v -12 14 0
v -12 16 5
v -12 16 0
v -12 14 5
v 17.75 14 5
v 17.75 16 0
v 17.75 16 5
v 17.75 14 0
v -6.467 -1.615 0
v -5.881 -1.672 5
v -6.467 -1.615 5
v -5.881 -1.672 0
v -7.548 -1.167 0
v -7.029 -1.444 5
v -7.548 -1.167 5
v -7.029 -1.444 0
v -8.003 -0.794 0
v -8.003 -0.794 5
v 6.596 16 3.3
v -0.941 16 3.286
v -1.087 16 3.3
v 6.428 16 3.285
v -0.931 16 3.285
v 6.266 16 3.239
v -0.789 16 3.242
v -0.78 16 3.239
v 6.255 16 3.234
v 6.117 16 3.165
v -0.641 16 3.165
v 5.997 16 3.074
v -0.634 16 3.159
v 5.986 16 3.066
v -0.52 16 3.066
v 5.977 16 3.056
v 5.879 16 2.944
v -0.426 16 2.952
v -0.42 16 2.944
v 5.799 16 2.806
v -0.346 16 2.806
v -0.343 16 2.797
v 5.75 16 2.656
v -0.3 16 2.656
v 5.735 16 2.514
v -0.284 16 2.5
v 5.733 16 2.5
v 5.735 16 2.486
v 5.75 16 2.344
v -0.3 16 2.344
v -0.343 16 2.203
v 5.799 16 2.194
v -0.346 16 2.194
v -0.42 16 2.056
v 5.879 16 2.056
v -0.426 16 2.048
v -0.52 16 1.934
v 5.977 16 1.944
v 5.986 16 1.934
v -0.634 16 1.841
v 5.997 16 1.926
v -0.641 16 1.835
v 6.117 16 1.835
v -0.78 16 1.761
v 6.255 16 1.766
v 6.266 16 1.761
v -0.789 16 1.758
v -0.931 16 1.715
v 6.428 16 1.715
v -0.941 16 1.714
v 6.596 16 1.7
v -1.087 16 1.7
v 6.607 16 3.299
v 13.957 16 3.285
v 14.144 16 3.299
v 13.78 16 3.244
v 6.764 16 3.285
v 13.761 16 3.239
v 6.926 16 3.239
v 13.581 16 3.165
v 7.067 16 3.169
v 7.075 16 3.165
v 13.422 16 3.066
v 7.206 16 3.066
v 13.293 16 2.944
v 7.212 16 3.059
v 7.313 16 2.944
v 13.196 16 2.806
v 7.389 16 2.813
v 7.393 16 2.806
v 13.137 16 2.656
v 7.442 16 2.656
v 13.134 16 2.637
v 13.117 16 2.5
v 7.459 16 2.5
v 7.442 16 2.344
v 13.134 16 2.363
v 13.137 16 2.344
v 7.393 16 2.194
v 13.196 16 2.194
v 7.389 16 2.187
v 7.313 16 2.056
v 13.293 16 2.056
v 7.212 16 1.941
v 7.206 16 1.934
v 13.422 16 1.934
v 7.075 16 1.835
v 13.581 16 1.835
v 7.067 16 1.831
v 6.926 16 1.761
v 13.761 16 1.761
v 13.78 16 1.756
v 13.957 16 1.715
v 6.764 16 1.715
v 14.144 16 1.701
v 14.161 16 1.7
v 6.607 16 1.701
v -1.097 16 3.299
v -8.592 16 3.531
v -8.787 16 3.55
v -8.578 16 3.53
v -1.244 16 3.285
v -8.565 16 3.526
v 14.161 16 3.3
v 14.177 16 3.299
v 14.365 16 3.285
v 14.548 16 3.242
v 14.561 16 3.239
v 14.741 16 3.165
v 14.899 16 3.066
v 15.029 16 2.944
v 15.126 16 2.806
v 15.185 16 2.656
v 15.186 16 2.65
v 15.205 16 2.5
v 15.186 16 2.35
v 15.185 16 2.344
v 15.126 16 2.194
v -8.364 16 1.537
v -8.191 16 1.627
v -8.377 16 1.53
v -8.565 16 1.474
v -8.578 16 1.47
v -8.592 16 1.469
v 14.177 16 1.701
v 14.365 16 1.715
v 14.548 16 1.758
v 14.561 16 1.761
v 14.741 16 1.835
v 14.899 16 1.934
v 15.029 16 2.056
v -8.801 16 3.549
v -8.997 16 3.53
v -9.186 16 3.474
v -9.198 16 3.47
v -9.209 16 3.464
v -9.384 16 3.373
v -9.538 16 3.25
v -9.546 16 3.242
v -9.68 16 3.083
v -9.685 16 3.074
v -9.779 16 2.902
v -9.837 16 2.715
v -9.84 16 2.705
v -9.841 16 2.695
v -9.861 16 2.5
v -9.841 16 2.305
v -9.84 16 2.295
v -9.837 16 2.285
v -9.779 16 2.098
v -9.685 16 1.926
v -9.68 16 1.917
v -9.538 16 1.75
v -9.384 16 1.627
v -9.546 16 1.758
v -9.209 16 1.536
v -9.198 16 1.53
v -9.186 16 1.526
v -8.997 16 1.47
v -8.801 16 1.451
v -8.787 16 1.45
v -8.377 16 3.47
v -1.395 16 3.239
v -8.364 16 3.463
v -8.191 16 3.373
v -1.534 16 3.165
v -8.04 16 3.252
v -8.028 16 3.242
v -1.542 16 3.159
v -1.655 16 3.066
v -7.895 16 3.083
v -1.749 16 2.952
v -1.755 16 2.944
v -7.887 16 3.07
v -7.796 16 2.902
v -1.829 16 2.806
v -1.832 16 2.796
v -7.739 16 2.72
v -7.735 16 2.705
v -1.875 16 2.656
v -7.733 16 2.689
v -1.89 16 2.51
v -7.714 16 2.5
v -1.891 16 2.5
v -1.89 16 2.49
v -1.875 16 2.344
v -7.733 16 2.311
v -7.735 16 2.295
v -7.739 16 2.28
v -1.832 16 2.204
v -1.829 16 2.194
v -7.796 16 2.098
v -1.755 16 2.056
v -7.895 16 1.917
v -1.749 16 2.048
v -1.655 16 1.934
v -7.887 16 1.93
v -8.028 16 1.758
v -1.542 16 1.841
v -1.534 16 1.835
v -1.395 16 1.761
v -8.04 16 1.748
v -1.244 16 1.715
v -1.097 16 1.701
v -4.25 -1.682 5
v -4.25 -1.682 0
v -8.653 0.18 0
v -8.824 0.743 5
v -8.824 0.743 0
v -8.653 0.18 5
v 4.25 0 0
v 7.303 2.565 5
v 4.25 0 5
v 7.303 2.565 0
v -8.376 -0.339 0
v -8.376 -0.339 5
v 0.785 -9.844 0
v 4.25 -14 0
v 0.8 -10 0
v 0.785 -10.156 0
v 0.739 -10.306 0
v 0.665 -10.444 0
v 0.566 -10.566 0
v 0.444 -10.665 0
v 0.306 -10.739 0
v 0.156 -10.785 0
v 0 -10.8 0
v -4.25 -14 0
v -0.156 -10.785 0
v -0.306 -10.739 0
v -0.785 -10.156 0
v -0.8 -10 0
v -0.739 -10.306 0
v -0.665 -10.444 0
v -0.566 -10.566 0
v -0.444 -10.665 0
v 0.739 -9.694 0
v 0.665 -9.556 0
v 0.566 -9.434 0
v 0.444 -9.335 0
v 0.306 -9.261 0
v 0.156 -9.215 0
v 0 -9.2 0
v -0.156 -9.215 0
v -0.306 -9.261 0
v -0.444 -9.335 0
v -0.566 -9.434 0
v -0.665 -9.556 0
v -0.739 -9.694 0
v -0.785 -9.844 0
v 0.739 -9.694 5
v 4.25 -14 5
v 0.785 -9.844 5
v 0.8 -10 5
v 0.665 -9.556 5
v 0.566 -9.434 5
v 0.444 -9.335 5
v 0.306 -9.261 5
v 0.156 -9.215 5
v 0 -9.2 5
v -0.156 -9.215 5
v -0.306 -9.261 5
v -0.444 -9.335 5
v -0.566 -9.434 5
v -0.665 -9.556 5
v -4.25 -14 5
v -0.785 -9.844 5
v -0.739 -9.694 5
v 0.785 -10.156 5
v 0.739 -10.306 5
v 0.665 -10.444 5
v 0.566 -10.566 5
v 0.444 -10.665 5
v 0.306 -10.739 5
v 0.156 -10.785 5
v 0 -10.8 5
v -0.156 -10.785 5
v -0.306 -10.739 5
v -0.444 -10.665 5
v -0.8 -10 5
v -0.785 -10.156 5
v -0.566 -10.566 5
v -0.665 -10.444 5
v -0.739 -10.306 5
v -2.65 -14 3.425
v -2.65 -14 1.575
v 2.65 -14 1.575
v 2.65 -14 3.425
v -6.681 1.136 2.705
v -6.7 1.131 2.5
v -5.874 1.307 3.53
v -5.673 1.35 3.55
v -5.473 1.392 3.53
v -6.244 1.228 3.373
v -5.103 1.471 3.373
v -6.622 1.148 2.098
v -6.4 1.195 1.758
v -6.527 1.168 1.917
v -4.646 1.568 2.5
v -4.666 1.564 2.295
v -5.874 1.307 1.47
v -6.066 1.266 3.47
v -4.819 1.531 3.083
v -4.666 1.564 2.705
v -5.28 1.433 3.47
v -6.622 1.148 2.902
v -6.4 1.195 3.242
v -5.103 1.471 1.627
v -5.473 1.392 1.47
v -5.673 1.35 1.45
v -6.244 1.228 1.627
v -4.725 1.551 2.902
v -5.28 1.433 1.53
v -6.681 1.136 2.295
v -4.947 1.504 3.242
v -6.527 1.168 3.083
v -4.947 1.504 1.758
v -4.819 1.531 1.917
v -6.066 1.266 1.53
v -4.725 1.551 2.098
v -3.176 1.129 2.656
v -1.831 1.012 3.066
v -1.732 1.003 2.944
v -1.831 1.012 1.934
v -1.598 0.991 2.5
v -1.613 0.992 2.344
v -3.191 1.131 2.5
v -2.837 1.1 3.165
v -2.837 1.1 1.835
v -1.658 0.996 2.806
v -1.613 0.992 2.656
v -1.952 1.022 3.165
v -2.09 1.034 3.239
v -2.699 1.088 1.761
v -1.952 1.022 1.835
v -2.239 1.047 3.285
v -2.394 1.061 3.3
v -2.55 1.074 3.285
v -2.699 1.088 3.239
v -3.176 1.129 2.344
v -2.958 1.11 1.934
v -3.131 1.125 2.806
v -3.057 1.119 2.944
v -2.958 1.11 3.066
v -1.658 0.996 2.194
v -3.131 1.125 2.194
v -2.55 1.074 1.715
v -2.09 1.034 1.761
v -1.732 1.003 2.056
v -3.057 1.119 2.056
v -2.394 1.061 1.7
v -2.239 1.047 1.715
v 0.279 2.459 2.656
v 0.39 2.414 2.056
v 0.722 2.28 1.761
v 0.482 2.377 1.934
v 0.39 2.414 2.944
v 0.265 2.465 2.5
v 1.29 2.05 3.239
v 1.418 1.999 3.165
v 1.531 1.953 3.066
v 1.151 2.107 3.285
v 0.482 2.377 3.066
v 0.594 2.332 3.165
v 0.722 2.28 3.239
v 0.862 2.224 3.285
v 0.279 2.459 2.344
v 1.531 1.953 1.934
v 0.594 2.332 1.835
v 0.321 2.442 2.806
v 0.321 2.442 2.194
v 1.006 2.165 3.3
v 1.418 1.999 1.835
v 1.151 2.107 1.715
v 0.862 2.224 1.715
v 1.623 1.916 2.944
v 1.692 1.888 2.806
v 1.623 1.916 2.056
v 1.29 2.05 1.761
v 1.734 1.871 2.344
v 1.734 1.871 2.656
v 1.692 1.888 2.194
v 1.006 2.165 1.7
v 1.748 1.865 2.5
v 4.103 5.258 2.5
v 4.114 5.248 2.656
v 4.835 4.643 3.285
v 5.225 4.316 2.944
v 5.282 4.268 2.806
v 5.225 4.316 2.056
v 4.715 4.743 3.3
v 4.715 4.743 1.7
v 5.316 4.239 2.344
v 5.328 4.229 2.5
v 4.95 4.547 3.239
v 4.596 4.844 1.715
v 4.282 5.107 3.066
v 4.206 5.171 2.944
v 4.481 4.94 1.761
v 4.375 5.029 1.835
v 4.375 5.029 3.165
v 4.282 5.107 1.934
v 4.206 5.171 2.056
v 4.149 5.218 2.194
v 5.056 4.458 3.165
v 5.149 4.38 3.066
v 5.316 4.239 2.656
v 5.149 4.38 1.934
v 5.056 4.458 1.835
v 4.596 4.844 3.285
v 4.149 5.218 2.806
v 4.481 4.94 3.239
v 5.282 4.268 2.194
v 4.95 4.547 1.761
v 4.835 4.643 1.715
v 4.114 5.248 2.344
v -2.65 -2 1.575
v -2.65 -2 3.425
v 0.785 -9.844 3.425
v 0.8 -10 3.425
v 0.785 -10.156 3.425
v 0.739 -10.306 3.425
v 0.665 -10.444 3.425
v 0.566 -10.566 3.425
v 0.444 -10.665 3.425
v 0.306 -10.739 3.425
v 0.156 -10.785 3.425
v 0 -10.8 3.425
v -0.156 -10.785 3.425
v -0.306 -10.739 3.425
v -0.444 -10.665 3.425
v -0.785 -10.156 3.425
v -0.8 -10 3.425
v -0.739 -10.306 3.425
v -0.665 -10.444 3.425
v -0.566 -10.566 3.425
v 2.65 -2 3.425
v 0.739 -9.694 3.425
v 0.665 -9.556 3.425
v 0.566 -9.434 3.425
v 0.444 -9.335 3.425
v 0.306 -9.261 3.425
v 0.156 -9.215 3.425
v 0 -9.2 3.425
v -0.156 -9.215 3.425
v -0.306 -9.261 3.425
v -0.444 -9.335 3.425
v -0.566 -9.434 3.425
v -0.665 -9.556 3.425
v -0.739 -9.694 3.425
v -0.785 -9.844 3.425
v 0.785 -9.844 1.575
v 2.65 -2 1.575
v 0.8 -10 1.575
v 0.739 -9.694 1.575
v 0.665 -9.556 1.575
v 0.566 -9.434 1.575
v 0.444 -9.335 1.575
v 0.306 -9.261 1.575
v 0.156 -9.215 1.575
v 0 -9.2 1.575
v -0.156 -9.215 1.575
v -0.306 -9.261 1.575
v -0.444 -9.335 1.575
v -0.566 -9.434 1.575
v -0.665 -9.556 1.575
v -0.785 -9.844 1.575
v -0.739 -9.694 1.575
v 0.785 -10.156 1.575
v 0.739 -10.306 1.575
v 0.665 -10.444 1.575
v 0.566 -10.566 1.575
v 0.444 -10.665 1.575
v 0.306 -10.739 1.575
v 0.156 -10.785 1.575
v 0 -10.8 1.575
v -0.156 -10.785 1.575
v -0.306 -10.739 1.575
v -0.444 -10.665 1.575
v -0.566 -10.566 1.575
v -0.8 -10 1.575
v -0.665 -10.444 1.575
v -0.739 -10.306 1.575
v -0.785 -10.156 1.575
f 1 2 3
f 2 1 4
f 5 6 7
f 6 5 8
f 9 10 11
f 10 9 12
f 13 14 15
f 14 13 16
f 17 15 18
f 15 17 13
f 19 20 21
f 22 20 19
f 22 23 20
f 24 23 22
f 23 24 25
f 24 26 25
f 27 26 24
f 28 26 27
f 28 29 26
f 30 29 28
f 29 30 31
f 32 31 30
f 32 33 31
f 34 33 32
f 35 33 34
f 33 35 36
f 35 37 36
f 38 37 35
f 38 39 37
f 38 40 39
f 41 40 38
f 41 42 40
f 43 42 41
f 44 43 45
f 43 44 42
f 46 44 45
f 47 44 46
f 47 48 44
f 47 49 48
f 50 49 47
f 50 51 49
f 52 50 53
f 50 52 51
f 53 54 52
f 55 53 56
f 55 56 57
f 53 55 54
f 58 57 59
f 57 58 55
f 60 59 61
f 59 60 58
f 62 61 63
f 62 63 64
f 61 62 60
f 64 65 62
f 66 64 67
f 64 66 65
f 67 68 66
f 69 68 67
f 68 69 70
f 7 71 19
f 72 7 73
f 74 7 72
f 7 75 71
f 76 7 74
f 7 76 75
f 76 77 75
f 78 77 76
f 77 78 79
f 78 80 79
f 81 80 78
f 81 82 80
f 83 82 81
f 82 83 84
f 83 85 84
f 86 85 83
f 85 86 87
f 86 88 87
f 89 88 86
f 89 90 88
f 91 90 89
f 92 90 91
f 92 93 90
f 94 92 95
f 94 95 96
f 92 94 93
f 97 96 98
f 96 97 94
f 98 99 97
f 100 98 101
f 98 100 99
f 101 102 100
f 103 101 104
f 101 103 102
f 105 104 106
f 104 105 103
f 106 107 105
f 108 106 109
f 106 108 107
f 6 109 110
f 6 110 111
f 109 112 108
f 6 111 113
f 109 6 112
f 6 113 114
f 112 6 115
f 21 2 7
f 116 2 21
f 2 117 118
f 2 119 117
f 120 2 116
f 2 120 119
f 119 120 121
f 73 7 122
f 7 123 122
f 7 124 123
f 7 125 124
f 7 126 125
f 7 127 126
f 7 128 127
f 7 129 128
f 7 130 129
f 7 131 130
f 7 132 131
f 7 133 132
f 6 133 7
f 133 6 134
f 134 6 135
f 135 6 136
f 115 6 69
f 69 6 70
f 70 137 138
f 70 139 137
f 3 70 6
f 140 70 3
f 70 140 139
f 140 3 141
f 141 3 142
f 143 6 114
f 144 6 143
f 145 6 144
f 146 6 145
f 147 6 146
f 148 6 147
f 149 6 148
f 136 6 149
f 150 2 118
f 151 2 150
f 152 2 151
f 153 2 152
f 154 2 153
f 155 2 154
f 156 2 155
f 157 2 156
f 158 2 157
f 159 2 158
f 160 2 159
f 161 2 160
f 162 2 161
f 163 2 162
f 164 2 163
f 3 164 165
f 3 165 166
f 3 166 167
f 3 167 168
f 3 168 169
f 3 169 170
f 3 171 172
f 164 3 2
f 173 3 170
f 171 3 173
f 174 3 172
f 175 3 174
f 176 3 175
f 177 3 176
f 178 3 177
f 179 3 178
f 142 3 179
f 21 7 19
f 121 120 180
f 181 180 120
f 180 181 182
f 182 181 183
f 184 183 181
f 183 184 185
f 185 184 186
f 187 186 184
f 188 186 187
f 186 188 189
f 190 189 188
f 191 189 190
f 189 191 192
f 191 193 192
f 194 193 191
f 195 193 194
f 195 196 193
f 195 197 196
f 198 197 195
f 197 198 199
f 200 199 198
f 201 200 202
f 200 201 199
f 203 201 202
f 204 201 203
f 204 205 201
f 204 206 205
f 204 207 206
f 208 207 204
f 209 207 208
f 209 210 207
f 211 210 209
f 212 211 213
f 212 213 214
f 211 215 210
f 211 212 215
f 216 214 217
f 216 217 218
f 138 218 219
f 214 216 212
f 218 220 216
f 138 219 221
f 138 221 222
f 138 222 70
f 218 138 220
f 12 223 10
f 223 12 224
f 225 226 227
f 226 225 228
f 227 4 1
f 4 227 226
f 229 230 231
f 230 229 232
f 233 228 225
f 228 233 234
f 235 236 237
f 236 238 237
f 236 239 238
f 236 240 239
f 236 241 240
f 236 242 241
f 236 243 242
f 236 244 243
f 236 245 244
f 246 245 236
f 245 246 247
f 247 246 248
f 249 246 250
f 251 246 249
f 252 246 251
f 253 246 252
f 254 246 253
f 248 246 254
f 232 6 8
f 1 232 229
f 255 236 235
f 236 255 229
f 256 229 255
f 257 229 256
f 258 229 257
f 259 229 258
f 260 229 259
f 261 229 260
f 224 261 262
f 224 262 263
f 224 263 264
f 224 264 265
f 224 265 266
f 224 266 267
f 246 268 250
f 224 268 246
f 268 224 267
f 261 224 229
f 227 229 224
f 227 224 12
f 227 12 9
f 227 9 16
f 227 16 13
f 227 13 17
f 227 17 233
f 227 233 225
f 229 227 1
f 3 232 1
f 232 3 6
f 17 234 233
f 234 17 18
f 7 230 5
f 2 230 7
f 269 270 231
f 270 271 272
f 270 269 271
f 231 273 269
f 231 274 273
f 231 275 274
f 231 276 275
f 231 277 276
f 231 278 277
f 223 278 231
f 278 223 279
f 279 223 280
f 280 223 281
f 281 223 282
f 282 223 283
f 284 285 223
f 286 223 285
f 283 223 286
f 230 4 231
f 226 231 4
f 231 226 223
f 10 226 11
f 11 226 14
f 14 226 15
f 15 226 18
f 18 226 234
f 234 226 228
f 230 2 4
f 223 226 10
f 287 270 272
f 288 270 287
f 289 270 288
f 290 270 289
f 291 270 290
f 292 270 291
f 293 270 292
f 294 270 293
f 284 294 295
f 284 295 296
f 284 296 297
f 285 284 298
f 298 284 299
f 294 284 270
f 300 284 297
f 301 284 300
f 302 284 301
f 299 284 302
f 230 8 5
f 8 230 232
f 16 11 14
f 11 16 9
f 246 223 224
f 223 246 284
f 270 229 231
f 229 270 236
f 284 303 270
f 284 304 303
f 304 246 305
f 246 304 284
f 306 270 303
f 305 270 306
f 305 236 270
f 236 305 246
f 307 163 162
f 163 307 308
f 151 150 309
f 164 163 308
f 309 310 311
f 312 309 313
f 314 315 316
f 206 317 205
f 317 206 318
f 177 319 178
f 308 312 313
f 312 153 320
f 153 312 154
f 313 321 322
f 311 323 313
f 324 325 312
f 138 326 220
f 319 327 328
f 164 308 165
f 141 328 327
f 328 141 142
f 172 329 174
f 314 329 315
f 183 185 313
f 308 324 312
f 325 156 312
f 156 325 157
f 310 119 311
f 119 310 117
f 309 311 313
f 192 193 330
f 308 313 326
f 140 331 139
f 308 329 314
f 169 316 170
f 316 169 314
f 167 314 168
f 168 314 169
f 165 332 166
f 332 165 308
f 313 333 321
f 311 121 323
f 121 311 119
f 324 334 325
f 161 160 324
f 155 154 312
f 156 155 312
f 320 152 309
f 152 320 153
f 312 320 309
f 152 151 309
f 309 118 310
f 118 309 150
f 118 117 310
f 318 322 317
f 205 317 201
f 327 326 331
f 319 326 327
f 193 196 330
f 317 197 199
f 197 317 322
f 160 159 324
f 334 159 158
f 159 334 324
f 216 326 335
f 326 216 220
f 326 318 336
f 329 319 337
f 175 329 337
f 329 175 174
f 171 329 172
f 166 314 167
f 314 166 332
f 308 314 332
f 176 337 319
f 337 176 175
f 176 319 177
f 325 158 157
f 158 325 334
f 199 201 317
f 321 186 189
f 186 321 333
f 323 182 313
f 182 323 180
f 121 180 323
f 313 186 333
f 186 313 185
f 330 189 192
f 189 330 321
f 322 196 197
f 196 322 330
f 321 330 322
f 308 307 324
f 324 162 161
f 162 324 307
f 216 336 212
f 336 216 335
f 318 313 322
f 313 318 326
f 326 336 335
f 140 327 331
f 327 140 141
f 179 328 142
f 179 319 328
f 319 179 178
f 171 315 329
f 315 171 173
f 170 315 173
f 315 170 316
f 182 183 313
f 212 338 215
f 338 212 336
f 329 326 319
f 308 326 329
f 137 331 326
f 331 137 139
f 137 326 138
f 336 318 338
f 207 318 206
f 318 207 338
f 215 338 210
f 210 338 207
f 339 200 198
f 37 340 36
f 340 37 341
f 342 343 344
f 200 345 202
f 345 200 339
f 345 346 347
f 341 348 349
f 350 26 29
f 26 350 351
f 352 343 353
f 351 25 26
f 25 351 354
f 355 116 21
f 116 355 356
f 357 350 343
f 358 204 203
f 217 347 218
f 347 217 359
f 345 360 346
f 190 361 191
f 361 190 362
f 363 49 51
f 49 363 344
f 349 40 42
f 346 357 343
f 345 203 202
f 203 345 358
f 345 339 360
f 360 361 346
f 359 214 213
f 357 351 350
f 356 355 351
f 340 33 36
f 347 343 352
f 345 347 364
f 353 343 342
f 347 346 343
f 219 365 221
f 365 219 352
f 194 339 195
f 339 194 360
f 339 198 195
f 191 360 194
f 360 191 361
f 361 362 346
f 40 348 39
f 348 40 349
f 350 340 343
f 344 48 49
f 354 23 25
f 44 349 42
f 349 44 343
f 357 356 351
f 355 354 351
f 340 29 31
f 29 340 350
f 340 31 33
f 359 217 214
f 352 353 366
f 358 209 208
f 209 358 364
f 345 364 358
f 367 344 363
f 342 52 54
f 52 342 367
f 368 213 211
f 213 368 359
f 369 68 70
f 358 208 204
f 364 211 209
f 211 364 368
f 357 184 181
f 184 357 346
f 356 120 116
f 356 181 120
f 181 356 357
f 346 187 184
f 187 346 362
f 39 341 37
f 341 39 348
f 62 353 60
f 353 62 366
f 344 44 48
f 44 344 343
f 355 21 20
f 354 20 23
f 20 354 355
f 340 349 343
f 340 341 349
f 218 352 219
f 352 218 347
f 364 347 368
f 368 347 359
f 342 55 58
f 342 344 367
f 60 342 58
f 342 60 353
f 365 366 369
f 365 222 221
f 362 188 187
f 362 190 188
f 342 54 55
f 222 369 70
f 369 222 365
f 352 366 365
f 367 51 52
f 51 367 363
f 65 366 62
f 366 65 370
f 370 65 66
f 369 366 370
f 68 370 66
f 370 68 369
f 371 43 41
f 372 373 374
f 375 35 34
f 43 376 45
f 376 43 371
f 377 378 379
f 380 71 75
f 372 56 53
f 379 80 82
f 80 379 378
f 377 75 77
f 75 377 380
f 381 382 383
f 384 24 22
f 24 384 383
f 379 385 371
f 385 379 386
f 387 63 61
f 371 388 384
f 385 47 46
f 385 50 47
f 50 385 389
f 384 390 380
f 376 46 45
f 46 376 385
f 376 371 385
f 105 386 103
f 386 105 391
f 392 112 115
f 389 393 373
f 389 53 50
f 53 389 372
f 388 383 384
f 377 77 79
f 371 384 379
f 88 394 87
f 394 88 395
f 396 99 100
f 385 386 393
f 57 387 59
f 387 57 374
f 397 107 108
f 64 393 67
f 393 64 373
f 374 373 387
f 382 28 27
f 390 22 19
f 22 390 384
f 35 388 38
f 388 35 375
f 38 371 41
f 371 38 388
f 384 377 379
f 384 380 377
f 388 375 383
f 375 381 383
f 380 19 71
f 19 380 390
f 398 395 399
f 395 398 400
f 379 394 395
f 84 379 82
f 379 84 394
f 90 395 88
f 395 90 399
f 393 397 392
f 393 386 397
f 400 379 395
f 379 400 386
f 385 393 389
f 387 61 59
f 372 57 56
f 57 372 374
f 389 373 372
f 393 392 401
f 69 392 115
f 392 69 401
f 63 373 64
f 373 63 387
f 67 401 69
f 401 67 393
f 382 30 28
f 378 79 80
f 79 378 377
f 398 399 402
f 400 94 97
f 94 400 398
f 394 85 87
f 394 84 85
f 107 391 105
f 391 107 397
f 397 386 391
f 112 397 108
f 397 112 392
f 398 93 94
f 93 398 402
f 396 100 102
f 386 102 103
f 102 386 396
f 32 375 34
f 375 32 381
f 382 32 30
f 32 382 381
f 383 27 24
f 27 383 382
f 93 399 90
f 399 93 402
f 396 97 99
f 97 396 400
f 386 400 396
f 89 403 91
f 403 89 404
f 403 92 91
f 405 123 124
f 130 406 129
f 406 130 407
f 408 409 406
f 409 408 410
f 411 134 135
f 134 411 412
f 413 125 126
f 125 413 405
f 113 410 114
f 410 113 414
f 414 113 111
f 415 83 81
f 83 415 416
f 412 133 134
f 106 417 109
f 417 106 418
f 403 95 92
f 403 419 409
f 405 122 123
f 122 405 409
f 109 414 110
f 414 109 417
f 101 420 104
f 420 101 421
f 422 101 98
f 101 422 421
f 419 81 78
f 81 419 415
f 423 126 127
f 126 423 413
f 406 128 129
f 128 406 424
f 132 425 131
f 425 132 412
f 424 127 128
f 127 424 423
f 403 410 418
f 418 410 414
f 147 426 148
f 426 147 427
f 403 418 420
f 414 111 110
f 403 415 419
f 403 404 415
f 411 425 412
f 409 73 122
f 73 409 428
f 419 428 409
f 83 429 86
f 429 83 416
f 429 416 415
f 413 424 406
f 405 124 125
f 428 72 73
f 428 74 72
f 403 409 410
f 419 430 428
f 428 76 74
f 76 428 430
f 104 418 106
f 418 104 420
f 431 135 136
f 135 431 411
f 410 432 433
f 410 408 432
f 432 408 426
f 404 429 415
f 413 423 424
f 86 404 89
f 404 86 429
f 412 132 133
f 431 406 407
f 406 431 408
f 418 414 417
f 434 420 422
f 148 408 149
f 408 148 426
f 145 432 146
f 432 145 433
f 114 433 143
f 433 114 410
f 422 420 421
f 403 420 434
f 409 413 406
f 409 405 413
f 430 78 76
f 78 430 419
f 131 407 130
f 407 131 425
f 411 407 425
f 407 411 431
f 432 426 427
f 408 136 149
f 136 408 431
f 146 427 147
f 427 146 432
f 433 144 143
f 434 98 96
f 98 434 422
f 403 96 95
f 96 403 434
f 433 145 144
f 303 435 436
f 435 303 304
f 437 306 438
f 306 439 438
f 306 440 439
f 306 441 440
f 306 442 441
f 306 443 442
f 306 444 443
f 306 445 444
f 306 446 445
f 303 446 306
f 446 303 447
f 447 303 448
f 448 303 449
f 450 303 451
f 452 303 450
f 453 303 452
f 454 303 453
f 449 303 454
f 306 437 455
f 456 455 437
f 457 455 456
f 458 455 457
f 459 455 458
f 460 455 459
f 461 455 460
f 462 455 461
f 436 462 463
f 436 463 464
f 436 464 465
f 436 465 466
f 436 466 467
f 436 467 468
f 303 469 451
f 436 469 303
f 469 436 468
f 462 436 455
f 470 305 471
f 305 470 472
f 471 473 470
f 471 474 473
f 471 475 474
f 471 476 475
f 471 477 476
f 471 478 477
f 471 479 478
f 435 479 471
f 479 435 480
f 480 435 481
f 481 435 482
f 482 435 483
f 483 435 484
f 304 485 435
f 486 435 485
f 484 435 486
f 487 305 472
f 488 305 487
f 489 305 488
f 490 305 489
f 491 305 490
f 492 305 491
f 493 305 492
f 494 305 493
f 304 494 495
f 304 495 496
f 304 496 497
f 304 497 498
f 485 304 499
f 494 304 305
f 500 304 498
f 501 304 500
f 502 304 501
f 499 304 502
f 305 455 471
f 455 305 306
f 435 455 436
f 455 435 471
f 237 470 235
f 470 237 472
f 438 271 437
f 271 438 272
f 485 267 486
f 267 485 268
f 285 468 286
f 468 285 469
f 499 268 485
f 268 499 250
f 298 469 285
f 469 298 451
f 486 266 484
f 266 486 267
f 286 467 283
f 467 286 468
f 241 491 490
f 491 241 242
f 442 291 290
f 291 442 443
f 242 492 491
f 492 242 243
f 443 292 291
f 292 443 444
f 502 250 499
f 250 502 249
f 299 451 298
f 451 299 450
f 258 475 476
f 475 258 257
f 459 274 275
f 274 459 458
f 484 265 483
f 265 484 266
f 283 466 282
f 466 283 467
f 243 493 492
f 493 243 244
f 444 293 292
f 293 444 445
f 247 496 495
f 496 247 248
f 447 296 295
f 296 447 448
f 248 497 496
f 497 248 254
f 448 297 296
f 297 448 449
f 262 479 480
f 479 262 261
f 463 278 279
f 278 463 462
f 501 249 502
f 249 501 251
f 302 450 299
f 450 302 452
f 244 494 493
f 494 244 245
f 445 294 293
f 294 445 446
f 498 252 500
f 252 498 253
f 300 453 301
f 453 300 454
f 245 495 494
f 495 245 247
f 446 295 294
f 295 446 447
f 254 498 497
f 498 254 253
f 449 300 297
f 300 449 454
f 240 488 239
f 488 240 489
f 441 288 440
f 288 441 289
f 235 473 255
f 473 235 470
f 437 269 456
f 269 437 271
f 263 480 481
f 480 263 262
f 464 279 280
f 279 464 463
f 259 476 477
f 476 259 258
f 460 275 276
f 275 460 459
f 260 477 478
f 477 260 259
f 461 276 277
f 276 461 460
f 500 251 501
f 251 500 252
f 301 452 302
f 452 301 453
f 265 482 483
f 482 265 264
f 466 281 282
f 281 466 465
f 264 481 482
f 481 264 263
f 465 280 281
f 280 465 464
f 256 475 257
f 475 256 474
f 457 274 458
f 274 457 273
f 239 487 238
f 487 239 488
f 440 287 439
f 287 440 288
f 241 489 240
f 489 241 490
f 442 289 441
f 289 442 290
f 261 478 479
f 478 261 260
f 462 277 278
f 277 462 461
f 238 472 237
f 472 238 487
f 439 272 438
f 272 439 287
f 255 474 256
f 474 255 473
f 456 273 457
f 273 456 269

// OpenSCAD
// 仿生蝴蝶 · 翼根座 (wing root socket)
//
// 一侧翅膀的所有碳杆（前缘 Ø2、两根翅脉 Ø1.5、后翅杆 Ø1.5）都插在这个零件上；
// 零件内侧的插槽套在舵机臂上，用 M2 螺丝 + 502 固定。
//
// 打印：PETG，层高 0.2 mm，3 圈壁，30% 填充；平放打印，不需要支撑。
//       左右各打印一个：side = "left" 和 side = "right"。
// 坐标：Y = 向外（翼尖方向），X = 向前（机头方向），Z = 向上。
//
// ★ 先量你的舵机臂（单臂），改下面 [舵机臂] 里的数字。

/* [左右] */
side = "left";              // "left" 或 "right"

/* [碳杆孔] */
rod_clearance = 0.1;        // 孔比碳杆大多少 (mm)
hole_depth = 15;            // 碳杆插入深度 (mm)
// 每根杆：[入口 X 位置 (mm), 角度 (°，正 = 向前偏), 碳杆直径 (mm)]
rods = [
  [ 9,  12, 2.0],           // 前缘
  [ 1,  -5, 1.5],           // 前翅翅脉 1
  [-7, -22, 1.5],           // 前翅翅脉 2
  [-15, -40, 1.5]           // 后翅杆
];

/* [舵机臂] */
horn_w = 5.0;               // 舵机臂宽度 (mm)
horn_t = 1.6;               // 舵机臂厚度 (mm)
horn_insert = 12;           // 舵机臂插进插槽的深度 (mm)
horn_screw_from_end = 4;    // 螺丝孔离插槽口的距离 (mm)，对准舵机臂最外面的孔

/* [结构] */
block_depth = 16;           // 翼根块厚度（向外）(mm)
block_h = 5;                // 翼根块高度 (mm)
rod_wall = 2.0;             // 碳杆孔周围的最小壁厚 (mm)
tab_len = 14;               // 插槽段长度 (mm)
tab_wall = 1.6;             // 插槽壁厚 (mm)
screw_d = 1.6;              // M2 自攻螺丝底孔 (mm)

/* [Hidden] */
$fn = 32;
tab_w = horn_w + 0.3 + 2 * tab_wall;

module socket_right() {
  difference() {
    union() {
      // 翼根块：沿着碳杆走向的扇形（比长方块轻约 30%）
      linear_extrude(block_h)
        hull() {
          for (r = rods) {
            translate([r[0], block_depth - 0.01]) square([0.01, 0.01]);
            // 孔底位置
            translate([r[0] - hole_depth * sin(r[1]), block_depth - hole_depth * cos(r[1])])
              circle(d = r[2] + 2 * rod_wall);
            // 外侧面上的孔口，两边各留壁厚
            translate([r[0] - (r[2] / 2 + rod_wall), block_depth - 2]) square([r[2] + 2 * rod_wall, 2]);
          }
          translate([-tab_w / 2, 0]) square([tab_w, 1]);
        }
      // 舵机臂插槽段（向内）
      translate([-tab_w / 2, -tab_len, 0]) cube([tab_w, tab_len + 0.01, block_h]);
    }
    // 碳杆孔：从外侧面斜着钻进去
    for (r = rods)
      translate([r[0], block_depth + 1, block_h / 2])
        rotate([0, 0, -r[1]])
          rotate([90, 0, 0])
            cylinder(d = r[2] + rod_clearance, h = hole_depth + 1);
    // 舵机臂插槽
    translate([-(horn_w + 0.3) / 2, -tab_len - 1, (block_h - horn_t - 0.25) / 2])
      cube([horn_w + 0.3, horn_insert + 1, horn_t + 0.25]);
    // 固定螺丝孔（竖直穿过插槽）
    translate([0, -tab_len + horn_screw_from_end, -1]) cylinder(d = screw_d, h = block_h + 2);
  }
}

// 左侧零件是右侧零件前后镜像
if (side == "right") socket_right();
else mirror([1, 0, 0]) socket_right();
